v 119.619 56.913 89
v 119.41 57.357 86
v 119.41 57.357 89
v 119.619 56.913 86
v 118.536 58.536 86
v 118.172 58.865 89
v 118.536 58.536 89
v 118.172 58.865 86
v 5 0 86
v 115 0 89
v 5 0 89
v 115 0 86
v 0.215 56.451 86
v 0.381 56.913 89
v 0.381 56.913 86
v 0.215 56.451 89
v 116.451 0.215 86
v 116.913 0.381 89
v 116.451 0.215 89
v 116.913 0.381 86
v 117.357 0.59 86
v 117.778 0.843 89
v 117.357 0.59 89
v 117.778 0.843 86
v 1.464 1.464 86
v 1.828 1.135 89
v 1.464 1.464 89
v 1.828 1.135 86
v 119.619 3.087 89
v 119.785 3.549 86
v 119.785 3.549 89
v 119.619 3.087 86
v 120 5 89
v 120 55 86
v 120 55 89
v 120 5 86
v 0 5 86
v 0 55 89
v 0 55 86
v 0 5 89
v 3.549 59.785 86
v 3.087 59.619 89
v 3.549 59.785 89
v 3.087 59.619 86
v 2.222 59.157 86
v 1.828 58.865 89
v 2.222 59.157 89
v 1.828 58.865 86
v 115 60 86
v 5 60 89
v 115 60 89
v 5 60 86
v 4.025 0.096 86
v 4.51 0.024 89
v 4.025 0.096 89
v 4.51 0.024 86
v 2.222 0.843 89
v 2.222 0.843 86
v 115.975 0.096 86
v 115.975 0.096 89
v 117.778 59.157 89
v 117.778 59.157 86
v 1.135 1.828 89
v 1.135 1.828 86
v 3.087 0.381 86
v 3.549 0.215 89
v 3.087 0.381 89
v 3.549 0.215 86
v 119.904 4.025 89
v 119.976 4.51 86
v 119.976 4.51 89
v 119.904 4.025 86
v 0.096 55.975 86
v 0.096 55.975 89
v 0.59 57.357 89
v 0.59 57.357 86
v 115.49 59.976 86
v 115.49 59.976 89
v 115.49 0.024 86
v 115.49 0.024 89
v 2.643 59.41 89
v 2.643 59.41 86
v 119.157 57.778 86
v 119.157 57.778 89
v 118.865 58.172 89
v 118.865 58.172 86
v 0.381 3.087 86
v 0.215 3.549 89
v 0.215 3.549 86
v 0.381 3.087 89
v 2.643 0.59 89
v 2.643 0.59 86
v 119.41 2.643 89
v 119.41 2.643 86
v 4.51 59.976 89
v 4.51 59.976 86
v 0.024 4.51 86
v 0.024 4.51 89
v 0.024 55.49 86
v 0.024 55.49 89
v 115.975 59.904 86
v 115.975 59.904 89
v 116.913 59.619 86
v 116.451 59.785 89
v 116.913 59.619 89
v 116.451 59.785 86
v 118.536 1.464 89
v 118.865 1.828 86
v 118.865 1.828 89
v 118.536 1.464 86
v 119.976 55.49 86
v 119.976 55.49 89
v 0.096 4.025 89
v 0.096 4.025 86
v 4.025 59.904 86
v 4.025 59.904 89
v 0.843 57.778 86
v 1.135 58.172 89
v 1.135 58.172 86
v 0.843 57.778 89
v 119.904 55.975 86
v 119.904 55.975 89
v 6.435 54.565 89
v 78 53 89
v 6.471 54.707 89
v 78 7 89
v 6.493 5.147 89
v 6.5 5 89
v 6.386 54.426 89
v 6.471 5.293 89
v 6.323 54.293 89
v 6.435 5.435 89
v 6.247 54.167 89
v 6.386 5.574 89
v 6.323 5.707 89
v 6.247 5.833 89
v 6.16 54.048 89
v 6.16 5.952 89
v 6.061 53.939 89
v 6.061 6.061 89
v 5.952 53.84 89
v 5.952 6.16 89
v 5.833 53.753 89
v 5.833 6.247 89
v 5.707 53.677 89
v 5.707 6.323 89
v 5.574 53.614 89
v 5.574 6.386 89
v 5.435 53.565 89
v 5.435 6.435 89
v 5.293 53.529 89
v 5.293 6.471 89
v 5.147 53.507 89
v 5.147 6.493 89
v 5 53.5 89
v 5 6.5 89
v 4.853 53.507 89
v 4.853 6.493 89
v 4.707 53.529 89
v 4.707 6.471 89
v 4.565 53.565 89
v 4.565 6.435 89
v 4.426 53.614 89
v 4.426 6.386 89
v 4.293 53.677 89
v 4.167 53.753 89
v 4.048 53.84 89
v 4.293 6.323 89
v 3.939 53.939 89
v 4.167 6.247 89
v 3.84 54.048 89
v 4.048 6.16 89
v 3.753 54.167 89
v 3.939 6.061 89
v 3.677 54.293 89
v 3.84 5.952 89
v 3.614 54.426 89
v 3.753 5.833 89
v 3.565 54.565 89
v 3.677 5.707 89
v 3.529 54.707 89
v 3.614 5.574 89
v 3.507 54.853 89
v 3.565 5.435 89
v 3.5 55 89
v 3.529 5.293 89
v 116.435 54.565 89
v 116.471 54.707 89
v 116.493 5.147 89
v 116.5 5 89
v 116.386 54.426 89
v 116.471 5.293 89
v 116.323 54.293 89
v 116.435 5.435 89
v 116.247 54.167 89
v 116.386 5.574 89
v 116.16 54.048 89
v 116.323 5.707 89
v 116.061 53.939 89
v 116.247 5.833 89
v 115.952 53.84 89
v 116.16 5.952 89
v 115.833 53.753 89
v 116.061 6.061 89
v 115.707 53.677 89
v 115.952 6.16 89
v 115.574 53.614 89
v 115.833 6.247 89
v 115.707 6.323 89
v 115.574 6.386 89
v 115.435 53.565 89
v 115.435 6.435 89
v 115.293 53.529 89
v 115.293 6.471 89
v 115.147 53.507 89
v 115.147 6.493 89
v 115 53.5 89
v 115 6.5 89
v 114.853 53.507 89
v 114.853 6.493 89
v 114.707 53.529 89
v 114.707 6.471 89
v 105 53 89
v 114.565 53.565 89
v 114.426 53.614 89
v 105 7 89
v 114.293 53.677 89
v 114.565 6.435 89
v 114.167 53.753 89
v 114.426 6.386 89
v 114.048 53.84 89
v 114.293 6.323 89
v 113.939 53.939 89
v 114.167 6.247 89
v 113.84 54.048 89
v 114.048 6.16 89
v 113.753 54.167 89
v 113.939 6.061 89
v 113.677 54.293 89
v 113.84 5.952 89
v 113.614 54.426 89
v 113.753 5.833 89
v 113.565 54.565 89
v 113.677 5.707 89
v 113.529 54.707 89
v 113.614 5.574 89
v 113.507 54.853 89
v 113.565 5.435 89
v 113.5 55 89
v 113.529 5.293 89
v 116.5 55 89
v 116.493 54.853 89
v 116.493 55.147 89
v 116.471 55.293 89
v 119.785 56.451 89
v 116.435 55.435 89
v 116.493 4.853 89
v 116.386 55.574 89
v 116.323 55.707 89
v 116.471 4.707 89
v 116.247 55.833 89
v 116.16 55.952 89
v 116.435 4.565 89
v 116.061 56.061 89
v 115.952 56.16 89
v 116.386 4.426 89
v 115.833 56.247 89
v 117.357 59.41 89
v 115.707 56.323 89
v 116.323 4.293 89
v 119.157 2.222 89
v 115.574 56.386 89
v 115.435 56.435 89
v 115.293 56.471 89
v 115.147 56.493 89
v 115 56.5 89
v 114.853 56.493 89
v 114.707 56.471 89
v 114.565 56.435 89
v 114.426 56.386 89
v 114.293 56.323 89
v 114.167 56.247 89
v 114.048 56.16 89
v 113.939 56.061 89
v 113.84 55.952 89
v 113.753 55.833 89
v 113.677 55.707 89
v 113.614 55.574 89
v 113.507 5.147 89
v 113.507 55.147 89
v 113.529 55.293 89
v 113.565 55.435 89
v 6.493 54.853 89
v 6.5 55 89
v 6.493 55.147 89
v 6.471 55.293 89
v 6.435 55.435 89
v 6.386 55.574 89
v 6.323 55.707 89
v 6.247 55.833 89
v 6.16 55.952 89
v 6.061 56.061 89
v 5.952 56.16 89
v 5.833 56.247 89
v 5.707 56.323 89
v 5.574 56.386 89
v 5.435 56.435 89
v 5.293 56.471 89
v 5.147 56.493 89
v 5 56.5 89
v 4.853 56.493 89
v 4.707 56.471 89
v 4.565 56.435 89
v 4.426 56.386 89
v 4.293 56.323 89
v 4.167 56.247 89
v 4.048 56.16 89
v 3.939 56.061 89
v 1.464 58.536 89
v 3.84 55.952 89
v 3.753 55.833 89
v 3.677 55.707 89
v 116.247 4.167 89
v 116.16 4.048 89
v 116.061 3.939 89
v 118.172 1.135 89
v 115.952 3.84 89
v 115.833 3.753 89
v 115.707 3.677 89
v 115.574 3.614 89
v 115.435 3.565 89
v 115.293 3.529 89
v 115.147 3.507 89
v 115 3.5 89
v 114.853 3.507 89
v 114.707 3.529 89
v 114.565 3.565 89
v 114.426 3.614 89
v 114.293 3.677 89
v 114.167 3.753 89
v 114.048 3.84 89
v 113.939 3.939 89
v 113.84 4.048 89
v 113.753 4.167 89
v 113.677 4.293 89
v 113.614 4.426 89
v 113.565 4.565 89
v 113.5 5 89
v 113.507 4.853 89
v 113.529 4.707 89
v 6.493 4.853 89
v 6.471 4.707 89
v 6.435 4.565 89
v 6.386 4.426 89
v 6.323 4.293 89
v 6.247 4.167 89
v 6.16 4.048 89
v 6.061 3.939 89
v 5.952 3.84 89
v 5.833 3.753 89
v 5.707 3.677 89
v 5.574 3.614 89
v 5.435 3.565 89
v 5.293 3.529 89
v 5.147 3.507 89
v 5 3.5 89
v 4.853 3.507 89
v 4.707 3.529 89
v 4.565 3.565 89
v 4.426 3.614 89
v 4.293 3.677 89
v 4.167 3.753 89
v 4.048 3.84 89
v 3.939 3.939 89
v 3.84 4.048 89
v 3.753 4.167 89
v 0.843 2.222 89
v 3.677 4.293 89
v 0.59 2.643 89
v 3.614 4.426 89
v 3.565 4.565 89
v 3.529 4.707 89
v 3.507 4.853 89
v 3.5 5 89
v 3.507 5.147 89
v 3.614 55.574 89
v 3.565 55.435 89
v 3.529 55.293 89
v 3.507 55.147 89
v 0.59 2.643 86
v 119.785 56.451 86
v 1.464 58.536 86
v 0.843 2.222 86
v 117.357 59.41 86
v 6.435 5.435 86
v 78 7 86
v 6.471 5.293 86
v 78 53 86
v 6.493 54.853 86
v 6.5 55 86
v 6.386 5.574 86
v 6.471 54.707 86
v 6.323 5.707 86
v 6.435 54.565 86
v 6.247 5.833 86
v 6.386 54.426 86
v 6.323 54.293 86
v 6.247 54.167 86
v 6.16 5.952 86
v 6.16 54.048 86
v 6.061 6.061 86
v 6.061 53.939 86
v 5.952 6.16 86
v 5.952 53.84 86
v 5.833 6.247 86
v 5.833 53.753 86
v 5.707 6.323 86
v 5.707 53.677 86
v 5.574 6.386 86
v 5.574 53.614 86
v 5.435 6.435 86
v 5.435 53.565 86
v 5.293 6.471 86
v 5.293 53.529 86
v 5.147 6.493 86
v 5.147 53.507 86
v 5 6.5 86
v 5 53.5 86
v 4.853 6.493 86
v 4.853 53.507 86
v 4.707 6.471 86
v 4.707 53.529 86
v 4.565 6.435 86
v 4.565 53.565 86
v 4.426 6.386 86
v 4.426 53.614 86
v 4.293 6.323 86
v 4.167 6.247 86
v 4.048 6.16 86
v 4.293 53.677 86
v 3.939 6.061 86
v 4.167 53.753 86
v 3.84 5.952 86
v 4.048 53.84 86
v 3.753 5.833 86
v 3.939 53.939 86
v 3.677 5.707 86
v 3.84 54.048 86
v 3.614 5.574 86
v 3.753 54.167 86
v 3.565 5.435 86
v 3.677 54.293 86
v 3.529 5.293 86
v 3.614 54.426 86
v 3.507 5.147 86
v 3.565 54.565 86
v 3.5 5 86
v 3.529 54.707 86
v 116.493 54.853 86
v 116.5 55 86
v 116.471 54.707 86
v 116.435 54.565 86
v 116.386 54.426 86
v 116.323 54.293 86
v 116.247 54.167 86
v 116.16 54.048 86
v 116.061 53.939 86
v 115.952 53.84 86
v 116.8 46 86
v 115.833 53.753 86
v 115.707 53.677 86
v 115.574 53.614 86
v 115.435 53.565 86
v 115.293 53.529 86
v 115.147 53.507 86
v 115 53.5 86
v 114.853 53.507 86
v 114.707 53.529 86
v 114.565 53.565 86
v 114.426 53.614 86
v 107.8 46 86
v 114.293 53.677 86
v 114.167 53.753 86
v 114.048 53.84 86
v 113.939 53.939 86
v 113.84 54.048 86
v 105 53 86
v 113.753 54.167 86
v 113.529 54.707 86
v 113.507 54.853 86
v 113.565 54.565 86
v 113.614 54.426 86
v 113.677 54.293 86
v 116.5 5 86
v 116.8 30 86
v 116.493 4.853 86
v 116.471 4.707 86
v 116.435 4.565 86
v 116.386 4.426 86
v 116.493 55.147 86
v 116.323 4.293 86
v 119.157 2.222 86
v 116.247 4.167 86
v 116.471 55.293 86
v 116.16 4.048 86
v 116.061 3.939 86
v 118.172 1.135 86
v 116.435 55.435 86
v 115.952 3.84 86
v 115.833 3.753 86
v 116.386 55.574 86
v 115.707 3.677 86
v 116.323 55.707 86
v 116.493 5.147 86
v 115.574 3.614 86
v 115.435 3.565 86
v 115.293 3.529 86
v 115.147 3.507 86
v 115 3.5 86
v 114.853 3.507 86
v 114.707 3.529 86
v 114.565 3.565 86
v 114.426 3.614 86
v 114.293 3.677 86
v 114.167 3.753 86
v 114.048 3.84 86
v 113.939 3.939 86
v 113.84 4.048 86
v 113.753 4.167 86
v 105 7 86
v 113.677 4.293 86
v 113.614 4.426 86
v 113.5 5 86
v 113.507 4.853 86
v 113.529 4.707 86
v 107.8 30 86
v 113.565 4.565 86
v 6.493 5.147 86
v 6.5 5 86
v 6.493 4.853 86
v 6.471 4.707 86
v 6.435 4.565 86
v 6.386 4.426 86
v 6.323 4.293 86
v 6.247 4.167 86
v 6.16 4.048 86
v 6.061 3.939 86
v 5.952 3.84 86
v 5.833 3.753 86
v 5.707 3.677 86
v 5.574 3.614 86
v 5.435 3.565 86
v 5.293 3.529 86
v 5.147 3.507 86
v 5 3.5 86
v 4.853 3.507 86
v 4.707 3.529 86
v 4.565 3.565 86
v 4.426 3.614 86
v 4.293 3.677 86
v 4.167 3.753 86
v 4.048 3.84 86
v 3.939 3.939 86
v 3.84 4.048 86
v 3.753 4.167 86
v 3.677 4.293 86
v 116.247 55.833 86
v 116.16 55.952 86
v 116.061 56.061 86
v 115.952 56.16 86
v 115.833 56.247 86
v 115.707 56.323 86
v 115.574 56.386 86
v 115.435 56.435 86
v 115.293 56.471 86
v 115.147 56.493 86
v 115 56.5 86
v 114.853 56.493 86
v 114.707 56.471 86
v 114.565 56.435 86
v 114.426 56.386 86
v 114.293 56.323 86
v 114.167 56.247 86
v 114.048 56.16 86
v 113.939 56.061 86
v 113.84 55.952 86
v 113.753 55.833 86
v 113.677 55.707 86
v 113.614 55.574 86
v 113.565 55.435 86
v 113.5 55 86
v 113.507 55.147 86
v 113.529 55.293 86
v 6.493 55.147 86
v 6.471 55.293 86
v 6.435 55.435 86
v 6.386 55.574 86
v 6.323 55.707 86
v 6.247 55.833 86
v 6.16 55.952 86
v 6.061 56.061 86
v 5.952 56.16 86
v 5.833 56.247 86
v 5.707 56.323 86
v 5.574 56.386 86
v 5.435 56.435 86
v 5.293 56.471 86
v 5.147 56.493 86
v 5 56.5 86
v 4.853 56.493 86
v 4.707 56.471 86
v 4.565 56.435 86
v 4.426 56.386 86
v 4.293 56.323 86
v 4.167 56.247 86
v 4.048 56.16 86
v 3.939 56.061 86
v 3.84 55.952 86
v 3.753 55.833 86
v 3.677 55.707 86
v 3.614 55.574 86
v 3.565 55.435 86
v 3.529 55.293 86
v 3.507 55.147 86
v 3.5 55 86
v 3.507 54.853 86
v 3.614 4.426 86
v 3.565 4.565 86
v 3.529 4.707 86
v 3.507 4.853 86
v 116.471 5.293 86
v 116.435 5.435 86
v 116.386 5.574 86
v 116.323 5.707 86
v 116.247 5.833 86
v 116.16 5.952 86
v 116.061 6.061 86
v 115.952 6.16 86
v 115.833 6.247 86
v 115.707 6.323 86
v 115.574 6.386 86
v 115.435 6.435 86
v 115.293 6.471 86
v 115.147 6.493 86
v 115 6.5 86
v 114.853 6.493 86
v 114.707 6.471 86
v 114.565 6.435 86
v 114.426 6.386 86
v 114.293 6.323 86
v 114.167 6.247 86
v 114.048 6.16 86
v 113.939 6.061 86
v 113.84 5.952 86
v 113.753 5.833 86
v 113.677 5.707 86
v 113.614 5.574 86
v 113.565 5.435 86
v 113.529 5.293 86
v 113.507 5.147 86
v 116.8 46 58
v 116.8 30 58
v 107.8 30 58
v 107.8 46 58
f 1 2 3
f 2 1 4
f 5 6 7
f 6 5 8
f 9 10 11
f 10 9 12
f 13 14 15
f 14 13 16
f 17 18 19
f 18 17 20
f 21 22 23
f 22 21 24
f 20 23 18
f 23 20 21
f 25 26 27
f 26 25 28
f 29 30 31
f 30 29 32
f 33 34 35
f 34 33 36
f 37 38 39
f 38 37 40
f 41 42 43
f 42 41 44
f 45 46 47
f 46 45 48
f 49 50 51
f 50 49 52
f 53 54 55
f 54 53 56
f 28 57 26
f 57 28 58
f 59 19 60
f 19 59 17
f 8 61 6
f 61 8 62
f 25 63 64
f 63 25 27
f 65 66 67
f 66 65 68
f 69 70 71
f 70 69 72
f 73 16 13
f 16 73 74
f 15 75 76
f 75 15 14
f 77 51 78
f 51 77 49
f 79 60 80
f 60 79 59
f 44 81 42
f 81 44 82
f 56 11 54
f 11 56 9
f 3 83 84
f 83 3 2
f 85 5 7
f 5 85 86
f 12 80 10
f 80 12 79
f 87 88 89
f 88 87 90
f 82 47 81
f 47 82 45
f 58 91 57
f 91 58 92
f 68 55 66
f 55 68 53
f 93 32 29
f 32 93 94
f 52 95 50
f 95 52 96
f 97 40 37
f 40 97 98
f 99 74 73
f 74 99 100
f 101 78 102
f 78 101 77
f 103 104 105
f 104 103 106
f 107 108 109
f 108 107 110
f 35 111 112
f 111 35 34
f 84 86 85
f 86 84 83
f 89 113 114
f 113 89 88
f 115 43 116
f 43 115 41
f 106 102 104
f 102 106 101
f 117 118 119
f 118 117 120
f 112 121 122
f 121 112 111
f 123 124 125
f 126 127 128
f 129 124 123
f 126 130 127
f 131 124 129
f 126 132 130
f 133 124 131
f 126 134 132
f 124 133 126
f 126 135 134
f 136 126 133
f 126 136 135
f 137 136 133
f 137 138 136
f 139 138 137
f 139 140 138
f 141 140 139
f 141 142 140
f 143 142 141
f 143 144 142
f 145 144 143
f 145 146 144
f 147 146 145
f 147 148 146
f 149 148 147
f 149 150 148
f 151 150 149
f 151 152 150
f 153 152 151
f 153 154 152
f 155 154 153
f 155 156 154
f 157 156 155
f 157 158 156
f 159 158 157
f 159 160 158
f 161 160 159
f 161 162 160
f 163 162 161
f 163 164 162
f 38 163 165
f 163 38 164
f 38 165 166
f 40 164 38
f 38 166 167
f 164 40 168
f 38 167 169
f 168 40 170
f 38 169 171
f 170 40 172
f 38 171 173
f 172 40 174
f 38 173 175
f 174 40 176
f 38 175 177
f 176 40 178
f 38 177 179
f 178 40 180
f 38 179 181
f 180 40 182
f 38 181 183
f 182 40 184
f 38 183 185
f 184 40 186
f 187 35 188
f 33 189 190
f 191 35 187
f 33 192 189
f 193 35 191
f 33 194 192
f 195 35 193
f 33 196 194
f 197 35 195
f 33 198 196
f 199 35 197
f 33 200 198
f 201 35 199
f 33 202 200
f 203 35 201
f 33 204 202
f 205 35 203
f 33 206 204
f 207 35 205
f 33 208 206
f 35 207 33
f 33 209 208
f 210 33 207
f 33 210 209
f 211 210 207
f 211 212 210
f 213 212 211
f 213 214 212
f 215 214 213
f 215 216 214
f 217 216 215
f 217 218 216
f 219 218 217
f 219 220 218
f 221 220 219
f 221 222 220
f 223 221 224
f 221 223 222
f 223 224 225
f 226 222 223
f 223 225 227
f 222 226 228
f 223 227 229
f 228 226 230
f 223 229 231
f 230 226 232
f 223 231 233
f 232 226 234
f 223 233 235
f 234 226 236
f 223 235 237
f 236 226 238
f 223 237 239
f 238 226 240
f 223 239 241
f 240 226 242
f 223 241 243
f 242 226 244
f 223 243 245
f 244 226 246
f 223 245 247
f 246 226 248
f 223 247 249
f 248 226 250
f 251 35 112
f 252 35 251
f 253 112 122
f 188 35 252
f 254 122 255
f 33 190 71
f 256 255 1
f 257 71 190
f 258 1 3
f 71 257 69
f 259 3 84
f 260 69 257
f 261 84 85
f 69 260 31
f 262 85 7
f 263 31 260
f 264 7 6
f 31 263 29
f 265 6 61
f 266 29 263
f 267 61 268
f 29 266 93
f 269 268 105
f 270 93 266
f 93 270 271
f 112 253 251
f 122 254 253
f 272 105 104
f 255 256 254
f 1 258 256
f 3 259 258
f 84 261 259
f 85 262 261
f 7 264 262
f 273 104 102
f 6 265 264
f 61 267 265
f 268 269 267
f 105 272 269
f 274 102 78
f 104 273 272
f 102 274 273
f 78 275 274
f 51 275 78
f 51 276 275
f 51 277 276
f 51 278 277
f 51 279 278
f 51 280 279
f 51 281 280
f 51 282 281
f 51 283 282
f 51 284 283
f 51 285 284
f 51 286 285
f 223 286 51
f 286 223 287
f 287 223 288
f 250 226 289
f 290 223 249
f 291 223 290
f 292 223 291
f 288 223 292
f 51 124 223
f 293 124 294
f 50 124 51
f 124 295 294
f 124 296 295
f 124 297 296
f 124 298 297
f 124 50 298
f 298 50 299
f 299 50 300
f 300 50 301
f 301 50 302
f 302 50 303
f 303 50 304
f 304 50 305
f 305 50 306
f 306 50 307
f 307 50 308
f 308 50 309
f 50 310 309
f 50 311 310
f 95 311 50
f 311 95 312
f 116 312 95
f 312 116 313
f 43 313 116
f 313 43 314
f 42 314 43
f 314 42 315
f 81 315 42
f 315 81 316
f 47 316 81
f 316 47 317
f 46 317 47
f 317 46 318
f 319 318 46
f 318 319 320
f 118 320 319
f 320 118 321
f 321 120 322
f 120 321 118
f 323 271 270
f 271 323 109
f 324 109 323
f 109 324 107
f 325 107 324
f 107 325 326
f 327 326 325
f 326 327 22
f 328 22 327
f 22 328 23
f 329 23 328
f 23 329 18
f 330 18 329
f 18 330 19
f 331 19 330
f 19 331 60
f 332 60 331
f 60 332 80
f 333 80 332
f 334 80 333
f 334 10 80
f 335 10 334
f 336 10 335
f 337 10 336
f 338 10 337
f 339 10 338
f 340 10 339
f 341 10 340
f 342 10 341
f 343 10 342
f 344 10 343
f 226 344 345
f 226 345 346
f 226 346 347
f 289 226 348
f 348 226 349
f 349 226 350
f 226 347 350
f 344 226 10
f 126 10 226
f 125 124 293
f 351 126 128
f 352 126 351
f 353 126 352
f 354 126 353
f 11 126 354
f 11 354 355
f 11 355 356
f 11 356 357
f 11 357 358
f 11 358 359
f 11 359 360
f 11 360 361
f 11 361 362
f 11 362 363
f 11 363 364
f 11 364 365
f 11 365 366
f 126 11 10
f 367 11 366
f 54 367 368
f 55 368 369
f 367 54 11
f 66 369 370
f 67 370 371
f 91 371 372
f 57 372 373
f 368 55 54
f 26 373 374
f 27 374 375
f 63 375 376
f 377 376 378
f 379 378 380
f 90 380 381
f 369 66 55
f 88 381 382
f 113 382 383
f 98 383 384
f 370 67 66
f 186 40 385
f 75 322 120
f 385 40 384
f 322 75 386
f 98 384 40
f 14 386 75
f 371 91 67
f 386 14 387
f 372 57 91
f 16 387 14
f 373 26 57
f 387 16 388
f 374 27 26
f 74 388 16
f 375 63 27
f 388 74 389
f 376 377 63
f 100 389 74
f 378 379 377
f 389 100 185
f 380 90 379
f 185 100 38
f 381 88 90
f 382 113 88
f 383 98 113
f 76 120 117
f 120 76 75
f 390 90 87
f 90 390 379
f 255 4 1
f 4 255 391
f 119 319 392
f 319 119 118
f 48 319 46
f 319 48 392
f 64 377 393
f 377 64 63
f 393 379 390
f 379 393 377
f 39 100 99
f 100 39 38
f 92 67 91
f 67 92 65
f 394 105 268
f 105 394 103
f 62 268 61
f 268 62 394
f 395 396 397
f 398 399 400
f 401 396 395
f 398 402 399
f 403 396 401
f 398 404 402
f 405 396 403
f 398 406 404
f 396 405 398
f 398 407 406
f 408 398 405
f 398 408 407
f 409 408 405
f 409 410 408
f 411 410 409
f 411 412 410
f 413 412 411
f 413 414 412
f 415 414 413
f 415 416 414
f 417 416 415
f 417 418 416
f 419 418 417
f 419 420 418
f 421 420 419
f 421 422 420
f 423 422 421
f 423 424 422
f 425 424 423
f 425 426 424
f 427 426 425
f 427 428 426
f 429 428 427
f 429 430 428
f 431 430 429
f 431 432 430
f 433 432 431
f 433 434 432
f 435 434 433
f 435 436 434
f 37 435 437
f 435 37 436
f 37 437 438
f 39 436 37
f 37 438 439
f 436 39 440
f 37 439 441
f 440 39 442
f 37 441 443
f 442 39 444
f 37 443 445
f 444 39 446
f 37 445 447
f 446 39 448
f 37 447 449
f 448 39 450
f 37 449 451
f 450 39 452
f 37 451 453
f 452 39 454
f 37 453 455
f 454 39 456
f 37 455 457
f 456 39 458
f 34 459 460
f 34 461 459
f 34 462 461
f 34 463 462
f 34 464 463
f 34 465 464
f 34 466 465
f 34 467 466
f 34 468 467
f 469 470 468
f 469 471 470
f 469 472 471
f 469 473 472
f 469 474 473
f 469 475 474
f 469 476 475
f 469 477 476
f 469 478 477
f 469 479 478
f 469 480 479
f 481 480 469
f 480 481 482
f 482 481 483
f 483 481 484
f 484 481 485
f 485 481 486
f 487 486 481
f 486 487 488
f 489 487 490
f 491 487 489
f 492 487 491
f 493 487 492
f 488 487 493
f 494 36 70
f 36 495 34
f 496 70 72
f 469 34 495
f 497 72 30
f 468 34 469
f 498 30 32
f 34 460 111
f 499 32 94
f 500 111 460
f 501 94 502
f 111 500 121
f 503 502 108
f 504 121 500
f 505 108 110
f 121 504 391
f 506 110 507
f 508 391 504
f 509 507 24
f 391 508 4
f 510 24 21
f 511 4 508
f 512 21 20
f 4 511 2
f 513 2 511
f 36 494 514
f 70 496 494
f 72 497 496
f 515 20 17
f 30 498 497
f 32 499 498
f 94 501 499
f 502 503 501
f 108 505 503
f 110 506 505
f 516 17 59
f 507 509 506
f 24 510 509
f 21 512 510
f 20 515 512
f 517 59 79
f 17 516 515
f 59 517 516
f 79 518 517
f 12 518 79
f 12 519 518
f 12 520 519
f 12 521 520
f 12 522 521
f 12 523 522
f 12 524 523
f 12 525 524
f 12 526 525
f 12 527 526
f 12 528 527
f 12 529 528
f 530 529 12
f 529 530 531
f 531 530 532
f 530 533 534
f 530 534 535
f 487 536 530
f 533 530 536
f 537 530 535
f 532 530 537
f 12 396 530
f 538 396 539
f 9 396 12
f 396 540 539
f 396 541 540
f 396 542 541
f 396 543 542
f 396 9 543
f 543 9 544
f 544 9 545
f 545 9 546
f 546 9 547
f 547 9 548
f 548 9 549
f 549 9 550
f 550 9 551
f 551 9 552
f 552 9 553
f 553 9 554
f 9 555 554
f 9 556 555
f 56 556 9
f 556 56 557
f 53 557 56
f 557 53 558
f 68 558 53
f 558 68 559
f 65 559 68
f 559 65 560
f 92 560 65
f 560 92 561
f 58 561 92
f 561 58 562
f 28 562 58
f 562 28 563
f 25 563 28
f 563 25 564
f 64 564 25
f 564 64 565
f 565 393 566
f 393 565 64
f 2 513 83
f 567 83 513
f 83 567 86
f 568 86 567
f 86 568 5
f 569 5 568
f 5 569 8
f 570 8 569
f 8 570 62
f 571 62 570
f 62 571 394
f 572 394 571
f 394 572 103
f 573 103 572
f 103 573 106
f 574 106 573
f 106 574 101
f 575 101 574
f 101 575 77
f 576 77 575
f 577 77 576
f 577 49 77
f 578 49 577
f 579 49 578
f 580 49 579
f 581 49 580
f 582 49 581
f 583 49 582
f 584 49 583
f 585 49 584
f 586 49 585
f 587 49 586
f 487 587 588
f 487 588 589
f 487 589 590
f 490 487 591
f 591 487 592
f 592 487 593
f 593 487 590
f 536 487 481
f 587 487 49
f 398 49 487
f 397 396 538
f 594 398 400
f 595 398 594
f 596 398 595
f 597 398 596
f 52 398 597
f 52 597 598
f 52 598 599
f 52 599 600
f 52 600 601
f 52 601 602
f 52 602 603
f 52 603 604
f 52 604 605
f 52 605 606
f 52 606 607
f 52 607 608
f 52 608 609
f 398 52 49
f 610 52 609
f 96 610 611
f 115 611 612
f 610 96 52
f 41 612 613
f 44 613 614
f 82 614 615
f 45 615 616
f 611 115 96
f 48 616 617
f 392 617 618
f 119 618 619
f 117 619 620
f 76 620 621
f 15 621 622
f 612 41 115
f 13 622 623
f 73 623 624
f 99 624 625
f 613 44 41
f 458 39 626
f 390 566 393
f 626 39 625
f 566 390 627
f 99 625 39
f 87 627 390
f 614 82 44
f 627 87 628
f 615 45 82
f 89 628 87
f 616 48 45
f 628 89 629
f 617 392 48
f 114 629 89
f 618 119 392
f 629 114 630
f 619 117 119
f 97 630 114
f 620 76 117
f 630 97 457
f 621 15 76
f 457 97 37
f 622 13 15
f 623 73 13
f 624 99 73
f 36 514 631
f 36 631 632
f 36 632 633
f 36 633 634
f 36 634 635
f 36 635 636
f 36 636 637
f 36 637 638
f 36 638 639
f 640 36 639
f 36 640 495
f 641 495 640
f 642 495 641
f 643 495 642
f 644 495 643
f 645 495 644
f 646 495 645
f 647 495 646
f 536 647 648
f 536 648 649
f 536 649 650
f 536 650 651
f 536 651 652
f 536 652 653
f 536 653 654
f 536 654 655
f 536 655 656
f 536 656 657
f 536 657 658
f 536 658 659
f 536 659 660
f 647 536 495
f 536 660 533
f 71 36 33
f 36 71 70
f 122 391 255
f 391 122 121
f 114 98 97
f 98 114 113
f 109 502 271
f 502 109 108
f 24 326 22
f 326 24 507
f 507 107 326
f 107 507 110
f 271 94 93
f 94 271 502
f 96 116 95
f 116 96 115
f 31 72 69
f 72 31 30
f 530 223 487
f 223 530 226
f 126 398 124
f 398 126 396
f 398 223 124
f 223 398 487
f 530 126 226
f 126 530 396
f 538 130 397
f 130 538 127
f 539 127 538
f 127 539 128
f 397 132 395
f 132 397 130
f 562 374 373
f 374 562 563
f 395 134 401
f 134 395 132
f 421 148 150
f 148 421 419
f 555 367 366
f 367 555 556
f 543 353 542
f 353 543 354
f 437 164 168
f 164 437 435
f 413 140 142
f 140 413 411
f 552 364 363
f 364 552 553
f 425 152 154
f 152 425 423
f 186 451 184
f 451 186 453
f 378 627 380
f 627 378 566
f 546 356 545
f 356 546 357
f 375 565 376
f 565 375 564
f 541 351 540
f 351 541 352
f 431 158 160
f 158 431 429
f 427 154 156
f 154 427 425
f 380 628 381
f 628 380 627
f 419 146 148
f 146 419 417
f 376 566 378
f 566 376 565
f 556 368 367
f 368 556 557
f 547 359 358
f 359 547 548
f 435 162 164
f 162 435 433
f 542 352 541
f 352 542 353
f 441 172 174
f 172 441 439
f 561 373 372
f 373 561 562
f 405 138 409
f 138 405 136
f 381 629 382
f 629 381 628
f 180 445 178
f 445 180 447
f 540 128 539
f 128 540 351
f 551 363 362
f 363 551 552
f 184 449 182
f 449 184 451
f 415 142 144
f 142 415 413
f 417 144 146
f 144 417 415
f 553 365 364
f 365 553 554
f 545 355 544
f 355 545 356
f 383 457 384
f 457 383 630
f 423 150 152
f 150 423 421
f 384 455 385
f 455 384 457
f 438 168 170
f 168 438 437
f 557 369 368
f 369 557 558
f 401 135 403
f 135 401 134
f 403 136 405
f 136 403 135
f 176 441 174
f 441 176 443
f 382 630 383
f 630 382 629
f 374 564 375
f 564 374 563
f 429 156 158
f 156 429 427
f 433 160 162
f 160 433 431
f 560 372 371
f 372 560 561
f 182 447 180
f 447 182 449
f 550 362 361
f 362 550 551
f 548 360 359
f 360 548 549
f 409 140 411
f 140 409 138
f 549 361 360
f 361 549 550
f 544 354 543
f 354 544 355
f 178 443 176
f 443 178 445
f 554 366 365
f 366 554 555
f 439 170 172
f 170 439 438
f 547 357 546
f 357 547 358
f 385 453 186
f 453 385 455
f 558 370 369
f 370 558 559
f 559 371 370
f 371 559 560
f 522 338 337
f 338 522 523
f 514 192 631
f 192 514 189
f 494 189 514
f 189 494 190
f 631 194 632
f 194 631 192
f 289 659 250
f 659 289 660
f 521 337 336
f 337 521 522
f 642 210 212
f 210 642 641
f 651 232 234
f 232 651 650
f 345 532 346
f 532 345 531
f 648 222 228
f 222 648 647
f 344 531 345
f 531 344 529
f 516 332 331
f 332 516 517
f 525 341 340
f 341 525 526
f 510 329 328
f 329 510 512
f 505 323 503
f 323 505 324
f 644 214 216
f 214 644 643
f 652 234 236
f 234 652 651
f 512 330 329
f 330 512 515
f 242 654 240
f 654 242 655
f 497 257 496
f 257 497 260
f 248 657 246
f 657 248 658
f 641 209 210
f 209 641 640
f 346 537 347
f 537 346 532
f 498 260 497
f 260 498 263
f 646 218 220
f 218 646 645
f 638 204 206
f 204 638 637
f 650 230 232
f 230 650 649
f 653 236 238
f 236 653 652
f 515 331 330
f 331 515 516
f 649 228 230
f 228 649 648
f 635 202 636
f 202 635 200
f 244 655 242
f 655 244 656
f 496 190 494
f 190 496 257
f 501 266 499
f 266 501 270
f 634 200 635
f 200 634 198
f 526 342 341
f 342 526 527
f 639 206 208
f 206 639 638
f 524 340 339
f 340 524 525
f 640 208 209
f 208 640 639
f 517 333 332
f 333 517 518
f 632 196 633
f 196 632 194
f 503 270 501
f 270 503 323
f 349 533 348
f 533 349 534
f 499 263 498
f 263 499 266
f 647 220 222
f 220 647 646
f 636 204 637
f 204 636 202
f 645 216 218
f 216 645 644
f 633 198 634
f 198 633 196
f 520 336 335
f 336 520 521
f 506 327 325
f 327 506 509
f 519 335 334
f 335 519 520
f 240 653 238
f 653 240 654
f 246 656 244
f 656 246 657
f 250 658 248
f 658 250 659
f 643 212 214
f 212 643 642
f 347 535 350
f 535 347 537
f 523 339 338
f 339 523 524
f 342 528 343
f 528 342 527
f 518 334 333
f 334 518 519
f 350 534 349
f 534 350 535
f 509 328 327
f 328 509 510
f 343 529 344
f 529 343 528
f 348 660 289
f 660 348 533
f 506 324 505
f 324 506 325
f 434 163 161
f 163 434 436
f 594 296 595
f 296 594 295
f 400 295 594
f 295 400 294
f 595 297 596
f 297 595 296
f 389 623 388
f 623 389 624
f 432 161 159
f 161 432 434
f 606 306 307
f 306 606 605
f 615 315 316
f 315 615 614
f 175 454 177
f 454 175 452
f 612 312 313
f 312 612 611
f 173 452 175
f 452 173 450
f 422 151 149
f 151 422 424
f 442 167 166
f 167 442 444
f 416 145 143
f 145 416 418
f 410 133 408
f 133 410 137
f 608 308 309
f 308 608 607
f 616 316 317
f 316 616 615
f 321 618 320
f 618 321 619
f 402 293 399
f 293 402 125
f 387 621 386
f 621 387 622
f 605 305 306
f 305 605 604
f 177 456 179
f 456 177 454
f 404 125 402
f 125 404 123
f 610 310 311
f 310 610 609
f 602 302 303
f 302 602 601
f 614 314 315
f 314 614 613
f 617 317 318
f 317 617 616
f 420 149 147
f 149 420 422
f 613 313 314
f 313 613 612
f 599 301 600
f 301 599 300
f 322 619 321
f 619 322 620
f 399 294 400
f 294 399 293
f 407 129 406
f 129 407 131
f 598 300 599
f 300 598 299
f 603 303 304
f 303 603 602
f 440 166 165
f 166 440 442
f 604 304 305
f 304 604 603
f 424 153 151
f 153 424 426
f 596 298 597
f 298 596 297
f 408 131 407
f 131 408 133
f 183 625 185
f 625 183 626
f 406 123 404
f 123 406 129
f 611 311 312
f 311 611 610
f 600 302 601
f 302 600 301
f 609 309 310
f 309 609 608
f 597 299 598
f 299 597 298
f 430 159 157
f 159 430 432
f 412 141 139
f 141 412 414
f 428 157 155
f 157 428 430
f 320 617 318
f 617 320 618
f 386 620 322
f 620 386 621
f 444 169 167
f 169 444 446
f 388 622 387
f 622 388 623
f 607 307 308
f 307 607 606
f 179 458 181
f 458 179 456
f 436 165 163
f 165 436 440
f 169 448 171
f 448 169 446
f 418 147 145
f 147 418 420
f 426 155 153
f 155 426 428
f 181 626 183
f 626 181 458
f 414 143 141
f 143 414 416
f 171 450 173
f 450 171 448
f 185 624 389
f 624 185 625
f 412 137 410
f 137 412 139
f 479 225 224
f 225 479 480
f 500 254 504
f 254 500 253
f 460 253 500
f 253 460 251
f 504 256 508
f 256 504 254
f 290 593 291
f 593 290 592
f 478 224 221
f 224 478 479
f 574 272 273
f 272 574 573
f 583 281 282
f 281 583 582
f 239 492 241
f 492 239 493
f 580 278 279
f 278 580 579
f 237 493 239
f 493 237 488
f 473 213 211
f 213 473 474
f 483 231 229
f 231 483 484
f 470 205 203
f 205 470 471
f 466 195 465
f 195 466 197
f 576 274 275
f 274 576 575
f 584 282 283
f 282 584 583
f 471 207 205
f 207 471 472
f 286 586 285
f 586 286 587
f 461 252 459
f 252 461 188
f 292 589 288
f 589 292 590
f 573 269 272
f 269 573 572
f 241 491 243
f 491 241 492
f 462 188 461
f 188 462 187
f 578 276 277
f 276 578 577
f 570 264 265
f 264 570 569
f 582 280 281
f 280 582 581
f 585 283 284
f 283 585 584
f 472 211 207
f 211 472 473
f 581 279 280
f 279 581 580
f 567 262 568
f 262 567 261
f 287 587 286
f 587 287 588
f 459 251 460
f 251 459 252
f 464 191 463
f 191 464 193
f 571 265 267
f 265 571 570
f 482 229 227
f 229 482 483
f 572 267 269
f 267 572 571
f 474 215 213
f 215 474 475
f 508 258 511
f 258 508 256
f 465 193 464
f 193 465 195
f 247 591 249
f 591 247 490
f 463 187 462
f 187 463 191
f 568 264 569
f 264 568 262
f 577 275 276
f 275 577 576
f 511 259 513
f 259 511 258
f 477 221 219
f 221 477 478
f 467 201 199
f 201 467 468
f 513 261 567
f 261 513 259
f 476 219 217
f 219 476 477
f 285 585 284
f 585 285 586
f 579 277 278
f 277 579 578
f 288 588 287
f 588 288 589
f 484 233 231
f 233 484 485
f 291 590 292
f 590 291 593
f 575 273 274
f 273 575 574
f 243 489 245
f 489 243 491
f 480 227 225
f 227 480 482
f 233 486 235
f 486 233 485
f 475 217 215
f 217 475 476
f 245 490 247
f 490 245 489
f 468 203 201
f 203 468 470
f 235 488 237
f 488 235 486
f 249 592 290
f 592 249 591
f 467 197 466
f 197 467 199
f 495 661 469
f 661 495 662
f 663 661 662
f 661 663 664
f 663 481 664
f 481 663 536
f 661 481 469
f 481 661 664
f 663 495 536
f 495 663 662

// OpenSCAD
$fn=64;
h=40;
l=120;
w=60;
wall=3;
screw=1.5;
r=5;

xt60h=9;
xt60w=16;
xt60d=24;

meter_w=46;
meter_l=27;

mount_l=53;
mount_w=39;
mount_inset=18;
r2=r;

deckel=true;

if (!deckel)
{
    translate([mount_inset,w/2-mount_w/2,wall])
    difference()
    {
        cylinder(r=r2,h=wall*2);
        translate([0,0,-1])
        cylinder(r=screw,h=wall*2+2);
    }
    translate([mount_inset+mount_l,w/2-mount_w/2,wall])
    difference()
    {
        cylinder(r=r2,h=wall*2);
        cylinder(r=screw,h=wall*2+2);
    }
    translate([mount_inset,w/2+mount_w/2,wall])
    difference()
    {
        cylinder(r=r2,h=wall*2);
        cylinder(r=screw,h=wall*2+2);
    }
    translate([mount_inset+mount_l,w/2+mount_w/2,wall])
    difference()
    {
        cylinder(r=r2,h=wall*2);
        cylinder(r=screw,h=wall*2+2);
    }
}
difference()
{
    translate([0,0,0])
    {
        if (!deckel)
        {
           translate([r2,r2,0])
            cylinder(r=r2, h=h);
            translate([r2,w-r2,0])
            cylinder(r=r2, h=h);
            translate([l-r2,r2,0])
            cylinder(r=r2, h=h);
            translate([l-r2,w-r2,0])
            cylinder(r=r2, h=h);
            difference()
            {
                roundbox(r,h,w,l);
                translate([wall,wall,wall])
                roundbox(r-1, h, w-wall*2,l-wall*2);
            }
        }
        
        if (deckel)
        {
            difference()
            {
                translate([0,0,wall*2+h*2])
                roundbox(r, wall, w,l);
                translate([l-meter_l-15, w/2-meter_w/2,h*2])
                cube([meter_l, meter_w,30]);
            }
        }
    }
        translate([r2,r2,wall+h/2])
        cylinder(r=screw, h=1000);
        translate([l-r2,r2,wall+h/2])
        cylinder(r=screw, h=1000);
        translate([r2,w-r2,wall+h/2])
        cylinder(r=screw, h=1000);
        translate([l-r2,w-r2,wall+h/2])
        cylinder(r=screw, h=1000);

    if (!deckel)
    {
        translate([l-xt60d+0.01, w/2,wall])
        cube([xt60d,xt60w,xt60h]);
        
        translate([-1,w/2-5,6+wall])
        rotate([0,90,0])
        cylinder(r=6,h=3*wall);
    }
}

if (!deckel)
{
    difference()
    {
        translate([l-xt60d+0.01-2, w/2-2,wall])
        cube([xt60d+2-wall,xt60w+4,3]);

        translate([l-xt60d+0.01, w/2,wall])
        cube([xt60d,xt60w,xt60h]);
    }
}
if (deckel)
{
    stempel=h-xt60h-wall;
    translate([l-3*wall-2*wall, w/2-2,h+2*wall])
    translate([wall-0.2,2,xt60h+wall])
    cube([3*wall,xt60w, stempel]);
}
module roundbox(rad, height,width,length)
{
    hull()
    {
        
        translate([rad,rad,0])
        cylinder(r=rad, h=height);

        translate([length-rad,rad,0])
        cylinder(r=rad, h=height);

        translate([rad,width-rad,0])
        cylinder(r=rad, h=height);

        translate([length-rad,width-rad,0])
        cylinder(r=rad, h=height);
        
    }
}
